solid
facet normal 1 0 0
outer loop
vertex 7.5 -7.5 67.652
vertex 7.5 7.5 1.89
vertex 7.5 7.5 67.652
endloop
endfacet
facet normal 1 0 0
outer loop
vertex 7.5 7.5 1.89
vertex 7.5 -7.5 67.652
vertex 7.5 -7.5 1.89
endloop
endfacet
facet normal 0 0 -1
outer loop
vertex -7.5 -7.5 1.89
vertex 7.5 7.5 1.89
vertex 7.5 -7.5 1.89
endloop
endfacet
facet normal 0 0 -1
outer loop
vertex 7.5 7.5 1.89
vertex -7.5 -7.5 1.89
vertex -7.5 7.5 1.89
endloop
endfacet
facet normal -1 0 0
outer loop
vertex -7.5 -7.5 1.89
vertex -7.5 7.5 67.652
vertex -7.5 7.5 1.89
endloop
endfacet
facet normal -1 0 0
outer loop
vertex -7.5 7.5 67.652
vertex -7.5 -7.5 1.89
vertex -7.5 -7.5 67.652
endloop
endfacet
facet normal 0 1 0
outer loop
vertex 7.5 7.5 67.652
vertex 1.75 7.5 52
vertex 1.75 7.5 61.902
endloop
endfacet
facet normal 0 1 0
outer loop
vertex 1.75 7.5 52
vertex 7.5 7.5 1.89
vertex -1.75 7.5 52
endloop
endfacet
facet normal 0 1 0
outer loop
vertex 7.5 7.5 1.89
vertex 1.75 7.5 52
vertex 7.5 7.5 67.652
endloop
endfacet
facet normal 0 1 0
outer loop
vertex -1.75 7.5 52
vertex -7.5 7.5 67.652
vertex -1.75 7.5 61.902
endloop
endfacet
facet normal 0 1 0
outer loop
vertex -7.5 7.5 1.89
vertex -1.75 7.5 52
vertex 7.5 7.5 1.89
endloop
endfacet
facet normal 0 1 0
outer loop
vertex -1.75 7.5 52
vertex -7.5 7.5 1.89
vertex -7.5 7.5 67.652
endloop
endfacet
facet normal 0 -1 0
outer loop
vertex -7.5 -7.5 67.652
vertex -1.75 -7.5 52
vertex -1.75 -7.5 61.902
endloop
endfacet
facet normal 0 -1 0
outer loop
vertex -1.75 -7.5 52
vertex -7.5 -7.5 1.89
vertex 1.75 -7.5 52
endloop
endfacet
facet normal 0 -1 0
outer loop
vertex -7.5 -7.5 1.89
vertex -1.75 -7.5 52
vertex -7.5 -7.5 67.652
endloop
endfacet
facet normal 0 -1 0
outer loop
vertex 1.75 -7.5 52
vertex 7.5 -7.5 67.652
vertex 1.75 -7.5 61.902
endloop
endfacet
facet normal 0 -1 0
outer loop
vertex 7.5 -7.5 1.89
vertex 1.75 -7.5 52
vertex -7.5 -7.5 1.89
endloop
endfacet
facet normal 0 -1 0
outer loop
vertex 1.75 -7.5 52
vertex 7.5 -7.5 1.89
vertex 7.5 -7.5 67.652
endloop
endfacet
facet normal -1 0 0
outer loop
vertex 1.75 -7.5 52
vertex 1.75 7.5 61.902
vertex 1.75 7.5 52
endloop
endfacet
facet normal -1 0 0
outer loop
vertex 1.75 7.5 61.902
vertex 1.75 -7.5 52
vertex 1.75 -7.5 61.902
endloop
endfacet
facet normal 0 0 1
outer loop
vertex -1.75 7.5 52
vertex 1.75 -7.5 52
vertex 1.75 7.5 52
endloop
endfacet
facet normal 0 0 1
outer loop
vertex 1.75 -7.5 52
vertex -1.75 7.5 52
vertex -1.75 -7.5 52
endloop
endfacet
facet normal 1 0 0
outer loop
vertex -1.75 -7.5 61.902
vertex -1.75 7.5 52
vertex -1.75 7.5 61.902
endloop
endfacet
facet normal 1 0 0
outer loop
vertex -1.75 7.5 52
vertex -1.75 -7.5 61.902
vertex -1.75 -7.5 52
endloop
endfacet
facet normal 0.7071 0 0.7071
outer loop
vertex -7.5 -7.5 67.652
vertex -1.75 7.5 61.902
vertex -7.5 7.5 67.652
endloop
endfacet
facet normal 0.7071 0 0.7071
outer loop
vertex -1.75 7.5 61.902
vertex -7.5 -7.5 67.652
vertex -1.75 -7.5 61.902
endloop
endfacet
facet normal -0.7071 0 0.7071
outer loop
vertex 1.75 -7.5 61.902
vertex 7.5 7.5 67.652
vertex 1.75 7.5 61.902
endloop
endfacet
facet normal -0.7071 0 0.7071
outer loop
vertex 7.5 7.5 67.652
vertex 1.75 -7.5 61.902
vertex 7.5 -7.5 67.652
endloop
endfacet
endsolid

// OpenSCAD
caliper_canyon_width = 3.5;
caliper_canyon_height = 15.9;
caliper_canyon_length = 15;
caliper_pyramid_height = 49+3;
canyon_clearance=10;

twt=1.89;
slop=.1;
h1=caliper_pyramid_height - canyon_clearance;
h2 = caliper_pyramid_height;
h3=caliper_pyramid_height + caliper_canyon_height;


w2 = max(3*caliper_canyon_width, caliper_canyon_length);
w1=h1*2+w2;


module onepiece()difference(){
  union(){
    translate([-w2/2,-w2/2,0]) cube([w2, w2, h3]);
    hull(){
      translate([-w1/2,-w1/2,0]) cube([w1,w1, .1]);
      translate([-w2/2,-w2/2,0]) cube([w2, w2, h1]);
    }
  }
  translate([-caliper_canyon_width/2,-w2/2-.1,h2]) cube([caliper_canyon_width, w2+.2,caliper_canyon_height+.1]); 
  translate([0,0,h3+.2*w2]) rotate([90,0,0]) rotate([0,0,45]) cube(w2+.2, center=true);
}

module mainpart() difference(){
  union(){
    hull(){
      translate([-w1/2,-w1/2,0]) cube([w1,w1, .1]);
      translate([-w2/2,-w2/2,0]) cube([w2, w2, h1]);
    }
  }
  
  translate([-(w2+slop)/2,-(w2+slop)/2,twt]) cube([w2+slop, w2+slop, h3]);
  
  w4=w1-2*twt-2*sqrt(2)*twt;
  hull(){
    translate([-w4/2,-w4/2,twt]) cube([w4,w4,.01]);
    translate([0,0,twt]) cube([.001,.001,w4/2]);
  }
}

module insert() difference(){
  union(){
    translate([-w2/2,-w2/2,twt]) cube([w2, w2, h3-twt]);
  }
  translate([-caliper_canyon_width/2,-w2/2-.1,h2]) cube([caliper_canyon_width, w2+.2,caliper_canyon_height+.1]); 
  translate([0,0,h3+.2*w2]) rotate([90,0,0]) rotate([0,0,45]) cube(w2+.2, center=true);
}

insert();
%difference(){
  mainpart();
  if($preview) translate([0,0,-1]) cube(999);
}
